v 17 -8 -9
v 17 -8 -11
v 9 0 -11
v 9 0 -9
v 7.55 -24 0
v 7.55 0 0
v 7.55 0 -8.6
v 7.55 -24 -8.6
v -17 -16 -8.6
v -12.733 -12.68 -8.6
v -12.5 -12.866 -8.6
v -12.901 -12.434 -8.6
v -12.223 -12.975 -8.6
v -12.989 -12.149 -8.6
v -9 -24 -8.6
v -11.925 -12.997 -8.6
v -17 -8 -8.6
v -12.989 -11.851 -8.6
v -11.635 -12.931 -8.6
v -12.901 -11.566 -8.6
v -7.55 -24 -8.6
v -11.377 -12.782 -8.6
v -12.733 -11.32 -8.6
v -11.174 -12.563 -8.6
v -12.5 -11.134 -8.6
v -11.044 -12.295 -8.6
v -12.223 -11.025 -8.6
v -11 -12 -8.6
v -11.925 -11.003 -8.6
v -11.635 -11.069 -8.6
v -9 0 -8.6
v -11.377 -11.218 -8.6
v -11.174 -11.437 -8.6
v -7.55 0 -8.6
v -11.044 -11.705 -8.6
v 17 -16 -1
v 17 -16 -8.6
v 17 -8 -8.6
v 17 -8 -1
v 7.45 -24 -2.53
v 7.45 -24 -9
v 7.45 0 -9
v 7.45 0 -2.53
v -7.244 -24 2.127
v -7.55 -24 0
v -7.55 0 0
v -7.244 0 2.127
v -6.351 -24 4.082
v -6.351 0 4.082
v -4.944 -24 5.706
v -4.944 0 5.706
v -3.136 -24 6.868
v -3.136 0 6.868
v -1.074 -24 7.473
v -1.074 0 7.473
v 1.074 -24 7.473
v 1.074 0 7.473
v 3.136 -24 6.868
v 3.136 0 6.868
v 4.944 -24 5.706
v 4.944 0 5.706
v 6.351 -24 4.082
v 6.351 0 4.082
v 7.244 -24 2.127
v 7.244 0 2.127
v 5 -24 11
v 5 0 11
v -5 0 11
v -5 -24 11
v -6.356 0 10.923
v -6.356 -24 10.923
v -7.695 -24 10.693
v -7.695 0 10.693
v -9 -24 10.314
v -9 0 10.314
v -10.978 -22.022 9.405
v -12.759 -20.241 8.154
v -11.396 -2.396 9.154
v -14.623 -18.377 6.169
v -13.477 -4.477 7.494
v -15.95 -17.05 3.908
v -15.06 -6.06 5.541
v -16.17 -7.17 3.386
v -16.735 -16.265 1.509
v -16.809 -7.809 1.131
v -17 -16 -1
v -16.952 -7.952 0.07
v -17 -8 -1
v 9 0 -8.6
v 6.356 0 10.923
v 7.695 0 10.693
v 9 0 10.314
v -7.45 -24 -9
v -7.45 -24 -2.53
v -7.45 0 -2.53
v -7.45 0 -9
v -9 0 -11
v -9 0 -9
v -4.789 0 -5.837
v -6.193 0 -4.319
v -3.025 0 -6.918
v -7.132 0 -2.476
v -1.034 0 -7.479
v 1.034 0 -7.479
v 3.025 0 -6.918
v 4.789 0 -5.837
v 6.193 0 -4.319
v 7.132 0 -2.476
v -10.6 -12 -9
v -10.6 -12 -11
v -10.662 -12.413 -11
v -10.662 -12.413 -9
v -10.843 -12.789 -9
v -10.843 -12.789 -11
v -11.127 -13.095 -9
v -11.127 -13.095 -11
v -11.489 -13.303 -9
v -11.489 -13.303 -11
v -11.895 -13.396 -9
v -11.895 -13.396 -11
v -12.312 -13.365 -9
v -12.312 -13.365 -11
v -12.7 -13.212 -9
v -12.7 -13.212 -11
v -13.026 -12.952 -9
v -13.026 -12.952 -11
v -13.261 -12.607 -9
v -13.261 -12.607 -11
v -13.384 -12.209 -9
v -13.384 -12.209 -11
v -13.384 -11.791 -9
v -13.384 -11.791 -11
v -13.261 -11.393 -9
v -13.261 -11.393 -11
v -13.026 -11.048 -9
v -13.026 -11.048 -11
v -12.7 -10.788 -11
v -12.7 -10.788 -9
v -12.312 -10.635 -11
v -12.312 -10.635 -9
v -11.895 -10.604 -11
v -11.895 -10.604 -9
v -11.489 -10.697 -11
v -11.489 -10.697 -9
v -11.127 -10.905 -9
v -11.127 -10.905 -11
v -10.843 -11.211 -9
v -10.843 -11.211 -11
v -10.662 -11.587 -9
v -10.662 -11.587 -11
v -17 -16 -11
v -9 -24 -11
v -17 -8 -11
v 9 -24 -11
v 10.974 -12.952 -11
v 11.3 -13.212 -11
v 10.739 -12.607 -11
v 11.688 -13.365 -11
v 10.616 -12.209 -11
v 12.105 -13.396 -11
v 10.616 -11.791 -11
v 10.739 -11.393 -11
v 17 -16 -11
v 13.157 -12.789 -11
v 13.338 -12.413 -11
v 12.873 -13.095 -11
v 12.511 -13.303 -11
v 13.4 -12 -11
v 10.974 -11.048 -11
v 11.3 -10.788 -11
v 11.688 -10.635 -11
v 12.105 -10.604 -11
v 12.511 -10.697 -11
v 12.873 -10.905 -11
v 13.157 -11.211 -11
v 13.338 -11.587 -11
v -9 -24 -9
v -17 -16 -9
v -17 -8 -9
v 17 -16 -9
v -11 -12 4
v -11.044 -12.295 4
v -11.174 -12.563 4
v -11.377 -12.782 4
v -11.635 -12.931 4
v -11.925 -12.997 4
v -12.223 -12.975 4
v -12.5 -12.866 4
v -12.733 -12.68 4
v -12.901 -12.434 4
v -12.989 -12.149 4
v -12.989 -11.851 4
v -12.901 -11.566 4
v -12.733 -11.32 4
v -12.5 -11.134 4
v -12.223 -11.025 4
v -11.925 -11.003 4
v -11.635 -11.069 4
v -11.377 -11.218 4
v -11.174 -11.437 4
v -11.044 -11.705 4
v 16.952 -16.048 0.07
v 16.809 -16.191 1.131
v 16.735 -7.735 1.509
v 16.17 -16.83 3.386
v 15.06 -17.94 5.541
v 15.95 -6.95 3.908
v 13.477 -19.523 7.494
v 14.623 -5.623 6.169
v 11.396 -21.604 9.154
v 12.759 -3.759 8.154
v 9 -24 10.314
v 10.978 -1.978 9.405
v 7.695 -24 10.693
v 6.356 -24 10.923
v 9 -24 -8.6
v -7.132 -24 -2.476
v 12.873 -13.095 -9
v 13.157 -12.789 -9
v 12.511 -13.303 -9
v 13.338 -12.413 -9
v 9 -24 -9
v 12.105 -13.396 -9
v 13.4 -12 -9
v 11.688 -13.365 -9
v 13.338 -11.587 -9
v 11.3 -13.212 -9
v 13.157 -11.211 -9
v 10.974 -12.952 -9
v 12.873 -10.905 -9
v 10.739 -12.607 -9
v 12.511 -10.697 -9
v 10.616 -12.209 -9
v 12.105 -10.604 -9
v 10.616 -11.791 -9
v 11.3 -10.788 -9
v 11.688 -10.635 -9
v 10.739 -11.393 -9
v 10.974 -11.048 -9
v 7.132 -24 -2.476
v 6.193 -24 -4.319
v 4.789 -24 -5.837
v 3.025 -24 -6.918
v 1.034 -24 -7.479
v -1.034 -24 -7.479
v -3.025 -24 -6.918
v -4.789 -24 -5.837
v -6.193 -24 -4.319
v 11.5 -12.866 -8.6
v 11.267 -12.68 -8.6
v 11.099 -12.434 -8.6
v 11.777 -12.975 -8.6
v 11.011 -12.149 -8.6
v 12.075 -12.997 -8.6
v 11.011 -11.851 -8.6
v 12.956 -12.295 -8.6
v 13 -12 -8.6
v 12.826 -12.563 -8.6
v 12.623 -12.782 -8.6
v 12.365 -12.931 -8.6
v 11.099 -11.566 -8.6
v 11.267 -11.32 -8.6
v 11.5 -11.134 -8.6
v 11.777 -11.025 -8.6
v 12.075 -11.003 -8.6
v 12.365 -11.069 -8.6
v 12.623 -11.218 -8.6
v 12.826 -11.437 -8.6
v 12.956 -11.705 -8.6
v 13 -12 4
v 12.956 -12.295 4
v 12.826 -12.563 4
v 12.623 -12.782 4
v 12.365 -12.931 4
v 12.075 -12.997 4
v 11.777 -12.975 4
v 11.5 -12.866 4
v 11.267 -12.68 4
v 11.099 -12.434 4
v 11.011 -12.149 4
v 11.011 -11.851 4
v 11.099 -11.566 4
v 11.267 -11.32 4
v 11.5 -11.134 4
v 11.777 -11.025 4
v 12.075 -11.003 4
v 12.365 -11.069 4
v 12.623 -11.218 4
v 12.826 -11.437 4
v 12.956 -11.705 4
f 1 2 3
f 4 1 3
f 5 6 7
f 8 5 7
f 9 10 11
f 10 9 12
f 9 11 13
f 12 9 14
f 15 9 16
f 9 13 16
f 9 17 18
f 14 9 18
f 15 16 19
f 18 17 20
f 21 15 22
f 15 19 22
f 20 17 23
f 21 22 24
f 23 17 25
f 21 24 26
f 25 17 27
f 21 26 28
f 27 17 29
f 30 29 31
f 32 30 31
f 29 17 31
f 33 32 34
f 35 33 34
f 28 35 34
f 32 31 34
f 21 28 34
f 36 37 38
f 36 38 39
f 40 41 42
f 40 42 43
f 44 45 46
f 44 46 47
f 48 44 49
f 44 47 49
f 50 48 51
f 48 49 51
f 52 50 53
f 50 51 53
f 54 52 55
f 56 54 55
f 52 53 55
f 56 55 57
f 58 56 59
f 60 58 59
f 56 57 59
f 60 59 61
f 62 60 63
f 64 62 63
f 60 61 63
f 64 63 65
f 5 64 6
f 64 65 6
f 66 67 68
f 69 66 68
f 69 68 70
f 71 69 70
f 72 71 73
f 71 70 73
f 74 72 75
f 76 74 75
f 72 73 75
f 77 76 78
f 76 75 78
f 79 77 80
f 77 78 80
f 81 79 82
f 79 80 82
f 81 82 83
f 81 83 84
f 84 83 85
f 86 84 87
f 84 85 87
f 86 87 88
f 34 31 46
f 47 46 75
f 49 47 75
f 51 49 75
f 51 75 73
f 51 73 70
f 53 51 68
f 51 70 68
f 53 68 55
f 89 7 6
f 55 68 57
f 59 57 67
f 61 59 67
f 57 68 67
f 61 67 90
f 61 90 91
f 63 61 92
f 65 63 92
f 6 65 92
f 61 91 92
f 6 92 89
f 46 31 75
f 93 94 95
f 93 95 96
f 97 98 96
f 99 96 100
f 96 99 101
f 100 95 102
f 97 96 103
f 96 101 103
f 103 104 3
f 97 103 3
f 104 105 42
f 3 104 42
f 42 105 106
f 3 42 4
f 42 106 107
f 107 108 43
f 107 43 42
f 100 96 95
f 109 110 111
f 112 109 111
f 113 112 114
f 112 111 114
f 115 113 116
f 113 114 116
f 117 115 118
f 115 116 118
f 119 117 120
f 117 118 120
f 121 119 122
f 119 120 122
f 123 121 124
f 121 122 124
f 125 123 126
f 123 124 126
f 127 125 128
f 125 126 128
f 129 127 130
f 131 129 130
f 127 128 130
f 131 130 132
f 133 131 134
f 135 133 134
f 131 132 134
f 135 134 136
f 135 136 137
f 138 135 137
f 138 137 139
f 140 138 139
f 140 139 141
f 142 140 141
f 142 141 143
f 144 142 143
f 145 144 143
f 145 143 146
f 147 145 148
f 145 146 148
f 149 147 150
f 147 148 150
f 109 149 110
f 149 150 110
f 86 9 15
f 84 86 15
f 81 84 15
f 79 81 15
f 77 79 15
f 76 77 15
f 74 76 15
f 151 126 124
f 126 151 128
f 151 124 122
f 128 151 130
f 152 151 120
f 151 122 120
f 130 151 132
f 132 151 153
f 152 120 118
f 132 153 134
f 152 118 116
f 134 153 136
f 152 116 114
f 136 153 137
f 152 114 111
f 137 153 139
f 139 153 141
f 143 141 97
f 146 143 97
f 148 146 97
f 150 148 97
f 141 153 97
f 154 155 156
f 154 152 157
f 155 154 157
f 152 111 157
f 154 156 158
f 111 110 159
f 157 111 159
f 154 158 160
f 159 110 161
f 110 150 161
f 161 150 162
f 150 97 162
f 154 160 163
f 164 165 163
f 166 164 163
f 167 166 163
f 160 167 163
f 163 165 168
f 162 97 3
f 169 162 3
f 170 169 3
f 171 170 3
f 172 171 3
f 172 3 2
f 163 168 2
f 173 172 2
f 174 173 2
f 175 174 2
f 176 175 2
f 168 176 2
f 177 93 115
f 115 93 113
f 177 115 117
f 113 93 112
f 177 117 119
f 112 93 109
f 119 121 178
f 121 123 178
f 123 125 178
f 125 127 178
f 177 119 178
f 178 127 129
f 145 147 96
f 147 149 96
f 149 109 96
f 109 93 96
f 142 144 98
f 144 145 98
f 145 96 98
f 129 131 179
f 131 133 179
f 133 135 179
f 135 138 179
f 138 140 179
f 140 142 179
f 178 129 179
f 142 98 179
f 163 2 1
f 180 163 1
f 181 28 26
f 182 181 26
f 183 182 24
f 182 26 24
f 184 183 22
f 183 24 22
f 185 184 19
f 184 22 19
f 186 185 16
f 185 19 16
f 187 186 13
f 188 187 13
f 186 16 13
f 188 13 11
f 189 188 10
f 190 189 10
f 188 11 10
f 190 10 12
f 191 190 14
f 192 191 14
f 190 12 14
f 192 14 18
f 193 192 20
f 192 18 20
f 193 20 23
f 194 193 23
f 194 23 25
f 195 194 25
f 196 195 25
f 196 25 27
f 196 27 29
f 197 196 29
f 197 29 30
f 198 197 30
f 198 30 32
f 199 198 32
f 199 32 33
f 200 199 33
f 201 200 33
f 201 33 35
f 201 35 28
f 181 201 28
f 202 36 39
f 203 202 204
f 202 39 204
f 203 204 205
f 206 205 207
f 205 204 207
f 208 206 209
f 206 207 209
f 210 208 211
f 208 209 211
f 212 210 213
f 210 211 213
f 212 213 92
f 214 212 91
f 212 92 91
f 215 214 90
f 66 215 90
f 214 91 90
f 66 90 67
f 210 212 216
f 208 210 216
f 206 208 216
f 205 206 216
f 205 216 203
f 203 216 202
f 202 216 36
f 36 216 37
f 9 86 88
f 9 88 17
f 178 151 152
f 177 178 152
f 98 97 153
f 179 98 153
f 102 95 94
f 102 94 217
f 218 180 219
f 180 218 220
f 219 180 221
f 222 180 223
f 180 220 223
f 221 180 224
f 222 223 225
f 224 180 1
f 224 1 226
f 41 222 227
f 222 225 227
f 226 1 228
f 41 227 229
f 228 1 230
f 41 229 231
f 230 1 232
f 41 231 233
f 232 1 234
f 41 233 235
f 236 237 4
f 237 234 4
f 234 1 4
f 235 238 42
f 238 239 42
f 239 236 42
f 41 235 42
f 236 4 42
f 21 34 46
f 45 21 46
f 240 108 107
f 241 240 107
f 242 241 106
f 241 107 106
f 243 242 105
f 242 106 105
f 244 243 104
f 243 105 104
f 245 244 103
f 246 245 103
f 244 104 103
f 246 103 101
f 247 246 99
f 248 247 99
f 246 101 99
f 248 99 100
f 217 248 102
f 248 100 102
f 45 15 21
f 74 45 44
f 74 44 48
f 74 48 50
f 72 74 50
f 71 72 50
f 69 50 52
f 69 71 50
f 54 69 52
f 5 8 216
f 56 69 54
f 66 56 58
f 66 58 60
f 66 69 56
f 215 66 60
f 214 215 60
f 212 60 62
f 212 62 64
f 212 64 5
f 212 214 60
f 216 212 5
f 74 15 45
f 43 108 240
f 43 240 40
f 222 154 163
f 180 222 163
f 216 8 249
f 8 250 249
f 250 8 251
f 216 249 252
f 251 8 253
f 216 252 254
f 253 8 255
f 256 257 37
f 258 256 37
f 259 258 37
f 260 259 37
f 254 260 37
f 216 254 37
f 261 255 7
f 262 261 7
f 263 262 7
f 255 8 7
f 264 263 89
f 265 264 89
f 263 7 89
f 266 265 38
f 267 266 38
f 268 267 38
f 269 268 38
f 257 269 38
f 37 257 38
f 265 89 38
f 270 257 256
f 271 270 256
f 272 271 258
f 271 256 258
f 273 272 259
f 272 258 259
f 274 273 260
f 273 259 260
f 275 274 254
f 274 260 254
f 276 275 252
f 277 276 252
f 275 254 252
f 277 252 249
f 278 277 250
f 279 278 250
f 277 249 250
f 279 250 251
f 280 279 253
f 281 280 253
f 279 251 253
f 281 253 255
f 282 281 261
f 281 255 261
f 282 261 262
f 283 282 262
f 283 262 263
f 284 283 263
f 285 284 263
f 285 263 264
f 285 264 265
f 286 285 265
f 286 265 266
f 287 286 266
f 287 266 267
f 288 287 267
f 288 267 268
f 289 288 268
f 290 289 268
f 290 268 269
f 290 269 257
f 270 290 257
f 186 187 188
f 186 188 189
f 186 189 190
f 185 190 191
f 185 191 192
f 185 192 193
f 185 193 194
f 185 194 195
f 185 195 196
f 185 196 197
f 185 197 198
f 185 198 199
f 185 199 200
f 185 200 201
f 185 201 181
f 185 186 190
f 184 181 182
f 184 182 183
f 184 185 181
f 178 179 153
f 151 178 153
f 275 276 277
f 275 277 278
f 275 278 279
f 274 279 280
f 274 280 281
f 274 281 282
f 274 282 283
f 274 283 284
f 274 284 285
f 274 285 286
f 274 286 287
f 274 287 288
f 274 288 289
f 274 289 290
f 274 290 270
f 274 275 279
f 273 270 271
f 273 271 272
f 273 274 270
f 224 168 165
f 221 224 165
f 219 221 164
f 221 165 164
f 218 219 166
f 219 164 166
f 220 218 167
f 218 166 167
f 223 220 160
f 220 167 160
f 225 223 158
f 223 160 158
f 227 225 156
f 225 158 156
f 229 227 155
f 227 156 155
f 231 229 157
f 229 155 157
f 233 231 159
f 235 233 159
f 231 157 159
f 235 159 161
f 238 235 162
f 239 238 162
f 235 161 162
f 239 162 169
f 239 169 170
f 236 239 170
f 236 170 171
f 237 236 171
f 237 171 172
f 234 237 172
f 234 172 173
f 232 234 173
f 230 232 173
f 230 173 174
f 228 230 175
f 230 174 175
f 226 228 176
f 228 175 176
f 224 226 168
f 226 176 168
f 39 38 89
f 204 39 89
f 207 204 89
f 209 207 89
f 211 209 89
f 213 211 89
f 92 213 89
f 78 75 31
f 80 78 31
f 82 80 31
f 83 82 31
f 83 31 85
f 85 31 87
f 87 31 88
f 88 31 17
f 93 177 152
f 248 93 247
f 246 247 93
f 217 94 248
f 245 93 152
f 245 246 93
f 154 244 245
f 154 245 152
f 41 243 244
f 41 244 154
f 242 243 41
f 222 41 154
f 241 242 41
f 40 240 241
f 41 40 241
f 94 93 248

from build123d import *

# Parameters (mm, degrees)
F1_DEPTH    = 24
F2_DEPTH    = 24
F4_DEPTH    = 22.001
F5_R        = 1
F6_DEPTH    = 15
F5_R_2      = 1.4
F7_DEPTH    = 2
F8_T1_DEPTH = 30.6026868141


# Not quite as in the source:
# - a fillet or chamfer that OpenCascade refuses, or shapes differently, is made with other operations: its cross-section is extruded or revolved along the edge and cut away or added


with BuildPart() as f1:
    # F0 (on Front) → F1 (new body)
    with BuildSketch(Plane.XZ):
        with BuildLine():
            Line((7.55, -8.6), (17, -8.6))
            Line((17, -8.6), (17, -1))
            ThreePointArc((17, -1), (13.4852813742, 7.4852813742), (5, 11))
            Line((5, 11), (-5, 11))
            ThreePointArc((-5, 11), (-13.4852813742, 7.4852813742), (-17, -1))
            Line((-17, -1), (-17, -8.6))
            Line((-17, -8.6), (-7.55, -8.6))
            Line((-7.55, -8.6), (-7.55, 0))
            ThreePointArc((-7.55, 0), (0, 7.55), (7.55, 0))
            Line((7.55, 0), (7.55, -8.6))
        make_face()
    extrude(amount=F1_DEPTH)


with BuildPart() as f2:
    # F0 (on Front) → F2 (new body)
    with BuildSketch(Plane.XZ):
        Polygon((-17, -11), (17, -11), (17, -9), (7.45, -9), (-7.45, -9), (-17, -9), align=None)
        with BuildLine():
            Line((-7.45, -9), (7.45, -9))
            Line((7.45, -9), (7.45, -1.2247448714))
            ThreePointArc((7.45, -1.2247448714), (0, -7.55), (-7.45, -1.2247448714))
            Line((-7.45, -1.2247448714), (-7.45, -9))
        make_face()
    extrude(amount=F2_DEPTH)


with BuildPart() as f4_tool:
    # F3 (on face) → F4 (new body, through all)
    with BuildSketch(Plane(origin=(0, 0, -11), x_dir=(1, 0, 0), z_dir=(0, 0, -1))):
        Polygon((-17, 16), (-9, 24), (-17, 24), align=None)
        Polygon((-9, 0), (-17, 8), (-17, 0), align=None)
        Polygon((17, 0), (17, 8), (9, 0), align=None)
        Polygon((17, 24), (9, 24), (17, 16), align=None)
    extrude(amount=-F4_DEPTH)


with BuildPart() as f1_1:
    add(f1.part)

    # F4: cut by f4_tool
    add(f4_tool.part, mode=Mode.SUBTRACT)


with BuildPart() as f2_1:
    add(f2.part)

    # F4: cut by f4_tool
    add(f4_tool.part, mode=Mode.SUBTRACT)


with BuildPart() as f6_tool:
    # F5 (on face) → F6 (new body)
    with BuildSketch(Plane(origin=(0, 0, -11), x_dir=(1, 0, 0), z_dir=(0, 0, -1))):
        with Locations((-12, 12)):
            Circle(F5_R)
        with Locations((12, 12)):
            Circle(F5_R)
    extrude(amount=-F6_DEPTH)


with BuildPart() as f1_2:
    add(f1_1.part)

    # F6: cut by f6_tool
    add(f6_tool.part, mode=Mode.SUBTRACT)


with BuildPart() as f2_2:
    add(f2_1.part)

    # F6: cut by f6_tool
    add(f6_tool.part, mode=Mode.SUBTRACT)

    # F5 (on face) → F7 (cut, through all)
    with BuildSketch(Plane(origin=(0, 0, -11), x_dir=(1, 0, 0), z_dir=(0, 0, -1))):
        with Locations((-12, 12)):
            Circle(F5_R_2)
        with Locations((-12, 12)):
            Circle(F5_R, mode=Mode.SUBTRACT)
        with Locations((12, 12)):
            Circle(F5_R_2)
        with Locations((12, 12)):
            Circle(F5_R, mode=Mode.SUBTRACT)
    extrude(amount=-F7_DEPTH, mode=Mode.SUBTRACT)

    # F8: chamfer of 2 on 2 edges, made by hand

    # F8_s2 → F8_t1 (cut)
    with BuildSketch(Plane.XZ.offset(-3.3013434071)):
        with BuildLine():
            Line((-7.5288861074, -2.5429238838), (-7.0535468383, -2.4627620222))
            Line((-7.0535468383, -2.4627620222), (-7.0157591141, -2.4496437945))
            ThreePointArc((-7.0157591141, -2.4496437945), (-7.2784359572, -1.8505323605), (-7.4105298013, -1.2182561568))
            Line((-7.4105298013, -1.2182561568), (-7.49, -1.2247448714))
            ThreePointArc((-7.49, -1.2247448714), (-7.49, -1.8838343776), (-7.5688861074, -2.5429238838))
            Line((-7.5688861074, -2.5429238838), (-7.5288861074, -2.5429238838))
        make_face()
        with BuildLine():
            Line((7.0535468383, -2.4627620222), (7.5288861074, -2.5429238838))
            Line((7.5288861074, -2.5429238838), (7.5688861074, -2.5429238838))
            ThreePointArc((7.5688861074, -2.5429238838), (7.49, -1.8838343776), (7.49, -1.2247448714))
            Line((7.49, -1.2247448714), (7.4105298013, -1.2182561568))
            ThreePointArc((7.4105298013, -1.2182561568), (7.2784359572, -1.8505323605), (7.0157591141, -2.4496437945))
            Line((7.0157591141, -2.4496437945), (7.0535468383, -2.4627620222))
        make_face()
    extrude(amount=F8_T1_DEPTH, mode=Mode.SUBTRACT)


solid = Compound([f1_2.part, f2_2.part])
